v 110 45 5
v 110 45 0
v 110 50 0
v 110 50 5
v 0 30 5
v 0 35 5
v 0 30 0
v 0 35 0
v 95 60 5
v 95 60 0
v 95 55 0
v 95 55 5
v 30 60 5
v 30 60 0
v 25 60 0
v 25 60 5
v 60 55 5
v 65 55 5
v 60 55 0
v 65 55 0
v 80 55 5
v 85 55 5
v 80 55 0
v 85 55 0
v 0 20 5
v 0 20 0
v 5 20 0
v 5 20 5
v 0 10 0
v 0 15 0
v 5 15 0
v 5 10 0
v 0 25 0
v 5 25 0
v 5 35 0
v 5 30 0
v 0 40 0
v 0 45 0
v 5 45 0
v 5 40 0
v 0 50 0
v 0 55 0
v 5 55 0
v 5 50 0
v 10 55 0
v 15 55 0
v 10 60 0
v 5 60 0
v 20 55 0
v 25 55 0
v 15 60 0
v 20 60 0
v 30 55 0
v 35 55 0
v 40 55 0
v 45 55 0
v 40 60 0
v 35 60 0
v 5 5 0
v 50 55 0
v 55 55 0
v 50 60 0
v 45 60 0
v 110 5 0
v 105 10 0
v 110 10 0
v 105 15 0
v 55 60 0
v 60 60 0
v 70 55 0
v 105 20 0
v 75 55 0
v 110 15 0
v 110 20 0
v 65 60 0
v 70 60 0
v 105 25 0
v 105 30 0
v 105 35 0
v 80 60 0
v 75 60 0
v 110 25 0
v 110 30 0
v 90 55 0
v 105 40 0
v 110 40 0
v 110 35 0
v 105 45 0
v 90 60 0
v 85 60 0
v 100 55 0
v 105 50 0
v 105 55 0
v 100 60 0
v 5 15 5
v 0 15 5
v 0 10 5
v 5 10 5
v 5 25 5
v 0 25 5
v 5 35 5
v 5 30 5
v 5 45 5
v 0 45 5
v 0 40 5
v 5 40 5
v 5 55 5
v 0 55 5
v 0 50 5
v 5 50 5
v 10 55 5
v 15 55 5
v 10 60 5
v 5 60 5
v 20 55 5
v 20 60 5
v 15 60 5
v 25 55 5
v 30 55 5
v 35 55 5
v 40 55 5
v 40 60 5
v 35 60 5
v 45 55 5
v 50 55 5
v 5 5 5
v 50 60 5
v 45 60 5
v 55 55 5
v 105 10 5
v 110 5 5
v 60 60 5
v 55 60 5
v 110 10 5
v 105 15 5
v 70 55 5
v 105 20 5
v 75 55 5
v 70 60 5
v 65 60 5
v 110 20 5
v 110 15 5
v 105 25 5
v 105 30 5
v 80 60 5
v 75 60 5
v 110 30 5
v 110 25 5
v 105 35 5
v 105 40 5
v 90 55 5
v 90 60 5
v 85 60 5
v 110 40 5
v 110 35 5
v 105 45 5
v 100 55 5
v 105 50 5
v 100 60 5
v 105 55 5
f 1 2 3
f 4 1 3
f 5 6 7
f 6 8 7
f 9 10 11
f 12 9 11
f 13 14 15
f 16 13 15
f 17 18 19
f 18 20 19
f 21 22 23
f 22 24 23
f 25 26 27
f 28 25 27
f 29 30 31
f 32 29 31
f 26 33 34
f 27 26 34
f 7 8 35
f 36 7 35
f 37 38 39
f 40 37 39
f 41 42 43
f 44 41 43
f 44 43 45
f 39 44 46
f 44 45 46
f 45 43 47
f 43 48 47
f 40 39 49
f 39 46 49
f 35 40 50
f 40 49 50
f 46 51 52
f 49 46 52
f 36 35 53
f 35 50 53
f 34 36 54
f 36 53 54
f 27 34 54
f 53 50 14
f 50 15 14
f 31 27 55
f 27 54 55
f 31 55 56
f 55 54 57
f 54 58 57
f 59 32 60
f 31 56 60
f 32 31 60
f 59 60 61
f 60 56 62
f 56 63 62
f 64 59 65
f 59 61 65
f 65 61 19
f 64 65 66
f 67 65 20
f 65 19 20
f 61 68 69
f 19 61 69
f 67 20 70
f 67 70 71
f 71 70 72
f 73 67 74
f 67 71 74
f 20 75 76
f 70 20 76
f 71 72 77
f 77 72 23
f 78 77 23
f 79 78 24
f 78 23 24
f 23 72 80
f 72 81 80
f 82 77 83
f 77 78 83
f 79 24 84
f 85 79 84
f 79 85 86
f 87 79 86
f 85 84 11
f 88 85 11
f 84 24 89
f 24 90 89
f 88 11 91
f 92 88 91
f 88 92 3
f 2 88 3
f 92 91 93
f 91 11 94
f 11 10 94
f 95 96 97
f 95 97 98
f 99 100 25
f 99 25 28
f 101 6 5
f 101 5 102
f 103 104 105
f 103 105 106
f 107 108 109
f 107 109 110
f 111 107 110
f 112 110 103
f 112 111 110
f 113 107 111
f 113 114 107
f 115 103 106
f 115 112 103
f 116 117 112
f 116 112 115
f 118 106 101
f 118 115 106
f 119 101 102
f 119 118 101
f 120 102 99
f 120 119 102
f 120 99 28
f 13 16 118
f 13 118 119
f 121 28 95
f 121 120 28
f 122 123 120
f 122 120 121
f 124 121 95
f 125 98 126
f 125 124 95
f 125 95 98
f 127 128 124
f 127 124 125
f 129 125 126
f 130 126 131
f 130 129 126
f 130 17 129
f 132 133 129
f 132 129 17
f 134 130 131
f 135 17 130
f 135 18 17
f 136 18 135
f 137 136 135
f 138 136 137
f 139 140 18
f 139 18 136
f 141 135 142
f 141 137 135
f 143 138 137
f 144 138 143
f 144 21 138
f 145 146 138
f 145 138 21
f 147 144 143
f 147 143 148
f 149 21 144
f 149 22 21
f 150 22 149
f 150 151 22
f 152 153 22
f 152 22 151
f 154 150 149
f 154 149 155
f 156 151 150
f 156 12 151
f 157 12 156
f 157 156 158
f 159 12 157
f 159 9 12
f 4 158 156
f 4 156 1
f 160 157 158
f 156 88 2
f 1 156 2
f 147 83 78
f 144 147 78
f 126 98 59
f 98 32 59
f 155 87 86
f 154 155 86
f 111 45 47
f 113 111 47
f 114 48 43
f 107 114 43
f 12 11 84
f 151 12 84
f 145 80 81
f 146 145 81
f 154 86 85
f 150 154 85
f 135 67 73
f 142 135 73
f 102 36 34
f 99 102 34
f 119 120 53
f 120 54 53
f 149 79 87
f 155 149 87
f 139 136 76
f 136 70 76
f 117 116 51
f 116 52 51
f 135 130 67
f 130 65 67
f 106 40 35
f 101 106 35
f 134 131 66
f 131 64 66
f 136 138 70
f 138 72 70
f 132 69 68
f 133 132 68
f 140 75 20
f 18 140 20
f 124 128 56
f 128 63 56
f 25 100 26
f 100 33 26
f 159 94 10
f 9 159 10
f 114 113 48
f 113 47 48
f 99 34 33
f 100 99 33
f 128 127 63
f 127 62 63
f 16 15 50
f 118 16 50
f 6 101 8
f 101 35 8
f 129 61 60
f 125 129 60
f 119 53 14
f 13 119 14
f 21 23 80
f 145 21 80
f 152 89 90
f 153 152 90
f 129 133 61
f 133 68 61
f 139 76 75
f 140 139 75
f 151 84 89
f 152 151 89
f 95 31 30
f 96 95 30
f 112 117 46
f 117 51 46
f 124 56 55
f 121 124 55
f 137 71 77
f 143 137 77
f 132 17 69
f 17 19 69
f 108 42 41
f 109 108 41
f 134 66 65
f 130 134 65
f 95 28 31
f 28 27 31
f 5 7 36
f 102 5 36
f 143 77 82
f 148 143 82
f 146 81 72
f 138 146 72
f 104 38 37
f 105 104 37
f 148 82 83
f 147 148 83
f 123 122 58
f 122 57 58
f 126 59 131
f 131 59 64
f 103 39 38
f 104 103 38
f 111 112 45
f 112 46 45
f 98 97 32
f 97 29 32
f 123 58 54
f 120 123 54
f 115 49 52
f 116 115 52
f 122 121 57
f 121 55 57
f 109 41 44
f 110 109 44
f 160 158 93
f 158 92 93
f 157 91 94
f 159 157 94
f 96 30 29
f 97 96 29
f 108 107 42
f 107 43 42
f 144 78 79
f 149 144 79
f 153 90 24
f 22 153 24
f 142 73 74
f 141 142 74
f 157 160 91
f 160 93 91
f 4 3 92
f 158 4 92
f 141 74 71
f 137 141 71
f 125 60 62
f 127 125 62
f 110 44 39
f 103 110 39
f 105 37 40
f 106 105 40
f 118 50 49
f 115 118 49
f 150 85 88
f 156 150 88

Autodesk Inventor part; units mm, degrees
ref_plane "YZ Plane" through (0, 0, 0) normal (1, 0, 0) x (0, 1, 0)
ref_plane "XZ Plane" through (0, 0, 0) normal (0, 1, 0) x (-1, 0, 0)
ref_plane "XY Plane" through (0, 0, 0) normal (0, 0, 1) x (1, 0, 0)
sketch "Sketch1" plane through (0, 0, 0) normal (0, 0, 1) x (1, 0, 0)
  point P0 (0, 0)
sketch "Sketch2" plane through (0, 0, 0) normal (0, 0, 1) x (1, 0, 0)
  line L0 (0, 0) -> (5, 0)
  line L1 (5, 0) -> (5, 5)
  line L2 (5, 5) -> (0, 5)
  line L3 (0, 5) -> (0, 0)
  line L4 (5, 5) -> (105, 5)
  line L5 (105, 5) -> (105, 55)
  line L6 (105, 55) -> (5, 55)
  line L7 (5, 55) -> (5, 5)
  line L8 (105, 55) -> (110, 55)
  line L9 (110, 55) -> (110, 60)
  line L10 (110, 60) -> (105, 60)
  line L11 (105, 60) -> (105, 55)
  line L12 (100, 60) -> (95, 60)
  line L13 (100, 55) -> (100, 60)
  line L14 (95, 60) -> (95, 55)
  line L15 (90, 60) -> (85, 60)
  line L16 (90, 55) -> (90, 60)
  line L17 (85, 60) -> (85, 55)
  line L18 (80, 60) -> (75, 60)
  line L19 (80, 55) -> (80, 60)
  line L20 (75, 60) -> (75, 55)
  line L21 (70, 60) -> (65, 60)
  line L22 (70, 55) -> (70, 60)
  line L23 (65, 60) -> (65, 55)
  line L24 (60, 60) -> (55, 60)
  line L25 (60, 55) -> (60, 60)
  line L26 (55, 60) -> (55, 55)
  line L27 (50, 60) -> (45, 60)
  line L28 (50, 55) -> (50, 60)
  line L29 (45, 60) -> (45, 55)
  line L30 (40, 60) -> (35, 60)
  line L31 (40, 55) -> (40, 60)
  line L32 (35, 60) -> (35, 55)
  line L33 (30, 60) -> (25, 60)
  line L34 (30, 55) -> (30, 60)
  line L35 (25, 60) -> (25, 55)
  line L36 (20, 60) -> (15, 60)
  line L37 (20, 55) -> (20, 60)
  line L38 (15, 60) -> (15, 55)
  line L39 (10, 60) -> (5, 60)
  line L40 (10, 55) -> (10, 60)
  line L41 (5, 60) -> (5, 55)
  line L42 (105, 50) -> (105, 45)
  line L43 (110, 45) -> (110, 50)
  line L44 (110, 50) -> (105, 50)
  line L45 (105, 45) -> (110, 45)
  line L46 (105, 40) -> (105, 35)
  line L47 (110, 35) -> (110, 40)
  line L48 (110, 40) -> (105, 40)
  line L49 (105, 35) -> (110, 35)
  line L50 (105, 30) -> (105, 25)
  line L51 (110, 25) -> (110, 30)
  line L52 (110, 30) -> (105, 30)
  line L53 (105, 25) -> (110, 25)
  line L54 (105, 20) -> (105, 15)
  line L55 (110, 15) -> (110, 20)
  line L56 (110, 20) -> (105, 20)
  line L57 (105, 15) -> (110, 15)
  line L58 (105, 10) -> (105, 5)
  line L59 (110, 5) -> (110, 10)
  line L60 (110, 10) -> (105, 10)
  line L61 (105, 5) -> (110, 5)
  line L62 (0, 10) -> (5, 10)
  line L63 (5, 10) -> (5, 15)
  line L64 (5, 15) -> (0, 15)
  line L65 (0, 15) -> (0, 10)
  line L66 (0, 20) -> (5, 20)
  line L67 (5, 20) -> (5, 25)
  line L68 (5, 25) -> (0, 25)
  line L69 (0, 25) -> (0, 20)
  line L70 (0, 30) -> (5, 30)
  line L71 (5, 30) -> (5, 35)
  line L72 (5, 35) -> (0, 35)
  line L73 (0, 35) -> (0, 30)
  line L74 (0, 40) -> (5, 40)
  line L75 (5, 40) -> (5, 45)
  line L76 (5, 45) -> (0, 45)
  line L77 (0, 45) -> (0, 40)
  line L78 (0, 50) -> (5, 50)
  line L79 (5, 50) -> (5, 55)
  line L80 (5, 55) -> (0, 55)
  line L81 (0, 55) -> (0, 50)
  line L82 (15, 5) -> (10, 5)
  line L83 (10, 0) -> (15, 0)
  line L84 (15, 0) -> (15, 5)
  line L85 (10, 5) -> (10, 0)
  line L86 (25, 5) -> (20, 5)
  line L87 (20, 0) -> (25, 0)
  line L88 (25, 0) -> (25, 5)
  line L89 (20, 5) -> (20, 0)
  line L90 (35, 5) -> (30, 5)
  line L91 (30, 0) -> (35, 0)
  line L92 (35, 0) -> (35, 5)
  line L93 (30, 5) -> (30, 0)
  line L94 (45, 5) -> (40, 5)
  line L95 (40, 0) -> (45, 0)
  line L96 (45, 0) -> (45, 5)
  line L97 (40, 5) -> (40, 0)
  line L98 (55, 5) -> (50, 5)
  line L99 (50, 0) -> (55, 0)
  line L100 (55, 0) -> (55, 5)
  line L101 (50, 5) -> (50, 0)
  line L102 (65, 5) -> (60, 5)
  line L103 (60, 0) -> (65, 0)
  line L104 (65, 0) -> (65, 5)
  line L105 (60, 5) -> (60, 0)
  line L106 (75, 5) -> (70, 5)
  line L107 (70, 0) -> (75, 0)
  line L108 (75, 0) -> (75, 5)
  line L109 (70, 5) -> (70, 0)
  line L110 (85, 5) -> (80, 5)
  line L111 (80, 0) -> (85, 0)
  line L112 (85, 0) -> (85, 5)
  line L113 (80, 5) -> (80, 0)
  line L114 (95, 5) -> (90, 5)
  line L115 (90, 0) -> (95, 0)
  line L116 (95, 0) -> (95, 5)
  line L117 (90, 5) -> (90, 0)
  line L118 (105, 5) -> (100, 5)
  line L119 (100, 0) -> (105, 0)
  line L120 (105, 0) -> (105, 5)
  line L121 (100, 5) -> (100, 0)
  dimension "d0" = 5
  dimension "d1" = 5
  dimension "d4" = 5
  dimension "d5" = 5
  dimension "d8" = 10
  dimension "d15" = 10
  dimension "d22" = 10
  dimension "d29" = 10
sketch "Sketch3" plane through (0, 0, 0) normal (0, 0, 1) x (1, 0, 0)
  point P0 (0, 0)
extrude "Extrusion1" add sketch "Sketch2" along normal blind 5 contours L7 L6 L5 L4 | L62 L65 L64 L7 | L66 L69 L68 L7 | L70 L73 L72 L7 | L74 L77 L76 L7 | L78 L81 L80 L7 | L41 L39 L40 L6 | L38 L36 L37 L6 | L35 L33 L34 L6 | L32 L30 L31 L6 | L29 L27 L28 L6 | L5 L60 L59 L61 | L26 L24 L25 L6 | L5 L56 L55 L57 | L23 L21 L22 L6 | L5 L52 L51 L53 | L20 L18 L19 L6 | L5 L48 L47 L49 | L17 L15 L16 L6 | L5 L44 L43 L45 | L14 L12 L13 L6
properties part number "frontbackside"
